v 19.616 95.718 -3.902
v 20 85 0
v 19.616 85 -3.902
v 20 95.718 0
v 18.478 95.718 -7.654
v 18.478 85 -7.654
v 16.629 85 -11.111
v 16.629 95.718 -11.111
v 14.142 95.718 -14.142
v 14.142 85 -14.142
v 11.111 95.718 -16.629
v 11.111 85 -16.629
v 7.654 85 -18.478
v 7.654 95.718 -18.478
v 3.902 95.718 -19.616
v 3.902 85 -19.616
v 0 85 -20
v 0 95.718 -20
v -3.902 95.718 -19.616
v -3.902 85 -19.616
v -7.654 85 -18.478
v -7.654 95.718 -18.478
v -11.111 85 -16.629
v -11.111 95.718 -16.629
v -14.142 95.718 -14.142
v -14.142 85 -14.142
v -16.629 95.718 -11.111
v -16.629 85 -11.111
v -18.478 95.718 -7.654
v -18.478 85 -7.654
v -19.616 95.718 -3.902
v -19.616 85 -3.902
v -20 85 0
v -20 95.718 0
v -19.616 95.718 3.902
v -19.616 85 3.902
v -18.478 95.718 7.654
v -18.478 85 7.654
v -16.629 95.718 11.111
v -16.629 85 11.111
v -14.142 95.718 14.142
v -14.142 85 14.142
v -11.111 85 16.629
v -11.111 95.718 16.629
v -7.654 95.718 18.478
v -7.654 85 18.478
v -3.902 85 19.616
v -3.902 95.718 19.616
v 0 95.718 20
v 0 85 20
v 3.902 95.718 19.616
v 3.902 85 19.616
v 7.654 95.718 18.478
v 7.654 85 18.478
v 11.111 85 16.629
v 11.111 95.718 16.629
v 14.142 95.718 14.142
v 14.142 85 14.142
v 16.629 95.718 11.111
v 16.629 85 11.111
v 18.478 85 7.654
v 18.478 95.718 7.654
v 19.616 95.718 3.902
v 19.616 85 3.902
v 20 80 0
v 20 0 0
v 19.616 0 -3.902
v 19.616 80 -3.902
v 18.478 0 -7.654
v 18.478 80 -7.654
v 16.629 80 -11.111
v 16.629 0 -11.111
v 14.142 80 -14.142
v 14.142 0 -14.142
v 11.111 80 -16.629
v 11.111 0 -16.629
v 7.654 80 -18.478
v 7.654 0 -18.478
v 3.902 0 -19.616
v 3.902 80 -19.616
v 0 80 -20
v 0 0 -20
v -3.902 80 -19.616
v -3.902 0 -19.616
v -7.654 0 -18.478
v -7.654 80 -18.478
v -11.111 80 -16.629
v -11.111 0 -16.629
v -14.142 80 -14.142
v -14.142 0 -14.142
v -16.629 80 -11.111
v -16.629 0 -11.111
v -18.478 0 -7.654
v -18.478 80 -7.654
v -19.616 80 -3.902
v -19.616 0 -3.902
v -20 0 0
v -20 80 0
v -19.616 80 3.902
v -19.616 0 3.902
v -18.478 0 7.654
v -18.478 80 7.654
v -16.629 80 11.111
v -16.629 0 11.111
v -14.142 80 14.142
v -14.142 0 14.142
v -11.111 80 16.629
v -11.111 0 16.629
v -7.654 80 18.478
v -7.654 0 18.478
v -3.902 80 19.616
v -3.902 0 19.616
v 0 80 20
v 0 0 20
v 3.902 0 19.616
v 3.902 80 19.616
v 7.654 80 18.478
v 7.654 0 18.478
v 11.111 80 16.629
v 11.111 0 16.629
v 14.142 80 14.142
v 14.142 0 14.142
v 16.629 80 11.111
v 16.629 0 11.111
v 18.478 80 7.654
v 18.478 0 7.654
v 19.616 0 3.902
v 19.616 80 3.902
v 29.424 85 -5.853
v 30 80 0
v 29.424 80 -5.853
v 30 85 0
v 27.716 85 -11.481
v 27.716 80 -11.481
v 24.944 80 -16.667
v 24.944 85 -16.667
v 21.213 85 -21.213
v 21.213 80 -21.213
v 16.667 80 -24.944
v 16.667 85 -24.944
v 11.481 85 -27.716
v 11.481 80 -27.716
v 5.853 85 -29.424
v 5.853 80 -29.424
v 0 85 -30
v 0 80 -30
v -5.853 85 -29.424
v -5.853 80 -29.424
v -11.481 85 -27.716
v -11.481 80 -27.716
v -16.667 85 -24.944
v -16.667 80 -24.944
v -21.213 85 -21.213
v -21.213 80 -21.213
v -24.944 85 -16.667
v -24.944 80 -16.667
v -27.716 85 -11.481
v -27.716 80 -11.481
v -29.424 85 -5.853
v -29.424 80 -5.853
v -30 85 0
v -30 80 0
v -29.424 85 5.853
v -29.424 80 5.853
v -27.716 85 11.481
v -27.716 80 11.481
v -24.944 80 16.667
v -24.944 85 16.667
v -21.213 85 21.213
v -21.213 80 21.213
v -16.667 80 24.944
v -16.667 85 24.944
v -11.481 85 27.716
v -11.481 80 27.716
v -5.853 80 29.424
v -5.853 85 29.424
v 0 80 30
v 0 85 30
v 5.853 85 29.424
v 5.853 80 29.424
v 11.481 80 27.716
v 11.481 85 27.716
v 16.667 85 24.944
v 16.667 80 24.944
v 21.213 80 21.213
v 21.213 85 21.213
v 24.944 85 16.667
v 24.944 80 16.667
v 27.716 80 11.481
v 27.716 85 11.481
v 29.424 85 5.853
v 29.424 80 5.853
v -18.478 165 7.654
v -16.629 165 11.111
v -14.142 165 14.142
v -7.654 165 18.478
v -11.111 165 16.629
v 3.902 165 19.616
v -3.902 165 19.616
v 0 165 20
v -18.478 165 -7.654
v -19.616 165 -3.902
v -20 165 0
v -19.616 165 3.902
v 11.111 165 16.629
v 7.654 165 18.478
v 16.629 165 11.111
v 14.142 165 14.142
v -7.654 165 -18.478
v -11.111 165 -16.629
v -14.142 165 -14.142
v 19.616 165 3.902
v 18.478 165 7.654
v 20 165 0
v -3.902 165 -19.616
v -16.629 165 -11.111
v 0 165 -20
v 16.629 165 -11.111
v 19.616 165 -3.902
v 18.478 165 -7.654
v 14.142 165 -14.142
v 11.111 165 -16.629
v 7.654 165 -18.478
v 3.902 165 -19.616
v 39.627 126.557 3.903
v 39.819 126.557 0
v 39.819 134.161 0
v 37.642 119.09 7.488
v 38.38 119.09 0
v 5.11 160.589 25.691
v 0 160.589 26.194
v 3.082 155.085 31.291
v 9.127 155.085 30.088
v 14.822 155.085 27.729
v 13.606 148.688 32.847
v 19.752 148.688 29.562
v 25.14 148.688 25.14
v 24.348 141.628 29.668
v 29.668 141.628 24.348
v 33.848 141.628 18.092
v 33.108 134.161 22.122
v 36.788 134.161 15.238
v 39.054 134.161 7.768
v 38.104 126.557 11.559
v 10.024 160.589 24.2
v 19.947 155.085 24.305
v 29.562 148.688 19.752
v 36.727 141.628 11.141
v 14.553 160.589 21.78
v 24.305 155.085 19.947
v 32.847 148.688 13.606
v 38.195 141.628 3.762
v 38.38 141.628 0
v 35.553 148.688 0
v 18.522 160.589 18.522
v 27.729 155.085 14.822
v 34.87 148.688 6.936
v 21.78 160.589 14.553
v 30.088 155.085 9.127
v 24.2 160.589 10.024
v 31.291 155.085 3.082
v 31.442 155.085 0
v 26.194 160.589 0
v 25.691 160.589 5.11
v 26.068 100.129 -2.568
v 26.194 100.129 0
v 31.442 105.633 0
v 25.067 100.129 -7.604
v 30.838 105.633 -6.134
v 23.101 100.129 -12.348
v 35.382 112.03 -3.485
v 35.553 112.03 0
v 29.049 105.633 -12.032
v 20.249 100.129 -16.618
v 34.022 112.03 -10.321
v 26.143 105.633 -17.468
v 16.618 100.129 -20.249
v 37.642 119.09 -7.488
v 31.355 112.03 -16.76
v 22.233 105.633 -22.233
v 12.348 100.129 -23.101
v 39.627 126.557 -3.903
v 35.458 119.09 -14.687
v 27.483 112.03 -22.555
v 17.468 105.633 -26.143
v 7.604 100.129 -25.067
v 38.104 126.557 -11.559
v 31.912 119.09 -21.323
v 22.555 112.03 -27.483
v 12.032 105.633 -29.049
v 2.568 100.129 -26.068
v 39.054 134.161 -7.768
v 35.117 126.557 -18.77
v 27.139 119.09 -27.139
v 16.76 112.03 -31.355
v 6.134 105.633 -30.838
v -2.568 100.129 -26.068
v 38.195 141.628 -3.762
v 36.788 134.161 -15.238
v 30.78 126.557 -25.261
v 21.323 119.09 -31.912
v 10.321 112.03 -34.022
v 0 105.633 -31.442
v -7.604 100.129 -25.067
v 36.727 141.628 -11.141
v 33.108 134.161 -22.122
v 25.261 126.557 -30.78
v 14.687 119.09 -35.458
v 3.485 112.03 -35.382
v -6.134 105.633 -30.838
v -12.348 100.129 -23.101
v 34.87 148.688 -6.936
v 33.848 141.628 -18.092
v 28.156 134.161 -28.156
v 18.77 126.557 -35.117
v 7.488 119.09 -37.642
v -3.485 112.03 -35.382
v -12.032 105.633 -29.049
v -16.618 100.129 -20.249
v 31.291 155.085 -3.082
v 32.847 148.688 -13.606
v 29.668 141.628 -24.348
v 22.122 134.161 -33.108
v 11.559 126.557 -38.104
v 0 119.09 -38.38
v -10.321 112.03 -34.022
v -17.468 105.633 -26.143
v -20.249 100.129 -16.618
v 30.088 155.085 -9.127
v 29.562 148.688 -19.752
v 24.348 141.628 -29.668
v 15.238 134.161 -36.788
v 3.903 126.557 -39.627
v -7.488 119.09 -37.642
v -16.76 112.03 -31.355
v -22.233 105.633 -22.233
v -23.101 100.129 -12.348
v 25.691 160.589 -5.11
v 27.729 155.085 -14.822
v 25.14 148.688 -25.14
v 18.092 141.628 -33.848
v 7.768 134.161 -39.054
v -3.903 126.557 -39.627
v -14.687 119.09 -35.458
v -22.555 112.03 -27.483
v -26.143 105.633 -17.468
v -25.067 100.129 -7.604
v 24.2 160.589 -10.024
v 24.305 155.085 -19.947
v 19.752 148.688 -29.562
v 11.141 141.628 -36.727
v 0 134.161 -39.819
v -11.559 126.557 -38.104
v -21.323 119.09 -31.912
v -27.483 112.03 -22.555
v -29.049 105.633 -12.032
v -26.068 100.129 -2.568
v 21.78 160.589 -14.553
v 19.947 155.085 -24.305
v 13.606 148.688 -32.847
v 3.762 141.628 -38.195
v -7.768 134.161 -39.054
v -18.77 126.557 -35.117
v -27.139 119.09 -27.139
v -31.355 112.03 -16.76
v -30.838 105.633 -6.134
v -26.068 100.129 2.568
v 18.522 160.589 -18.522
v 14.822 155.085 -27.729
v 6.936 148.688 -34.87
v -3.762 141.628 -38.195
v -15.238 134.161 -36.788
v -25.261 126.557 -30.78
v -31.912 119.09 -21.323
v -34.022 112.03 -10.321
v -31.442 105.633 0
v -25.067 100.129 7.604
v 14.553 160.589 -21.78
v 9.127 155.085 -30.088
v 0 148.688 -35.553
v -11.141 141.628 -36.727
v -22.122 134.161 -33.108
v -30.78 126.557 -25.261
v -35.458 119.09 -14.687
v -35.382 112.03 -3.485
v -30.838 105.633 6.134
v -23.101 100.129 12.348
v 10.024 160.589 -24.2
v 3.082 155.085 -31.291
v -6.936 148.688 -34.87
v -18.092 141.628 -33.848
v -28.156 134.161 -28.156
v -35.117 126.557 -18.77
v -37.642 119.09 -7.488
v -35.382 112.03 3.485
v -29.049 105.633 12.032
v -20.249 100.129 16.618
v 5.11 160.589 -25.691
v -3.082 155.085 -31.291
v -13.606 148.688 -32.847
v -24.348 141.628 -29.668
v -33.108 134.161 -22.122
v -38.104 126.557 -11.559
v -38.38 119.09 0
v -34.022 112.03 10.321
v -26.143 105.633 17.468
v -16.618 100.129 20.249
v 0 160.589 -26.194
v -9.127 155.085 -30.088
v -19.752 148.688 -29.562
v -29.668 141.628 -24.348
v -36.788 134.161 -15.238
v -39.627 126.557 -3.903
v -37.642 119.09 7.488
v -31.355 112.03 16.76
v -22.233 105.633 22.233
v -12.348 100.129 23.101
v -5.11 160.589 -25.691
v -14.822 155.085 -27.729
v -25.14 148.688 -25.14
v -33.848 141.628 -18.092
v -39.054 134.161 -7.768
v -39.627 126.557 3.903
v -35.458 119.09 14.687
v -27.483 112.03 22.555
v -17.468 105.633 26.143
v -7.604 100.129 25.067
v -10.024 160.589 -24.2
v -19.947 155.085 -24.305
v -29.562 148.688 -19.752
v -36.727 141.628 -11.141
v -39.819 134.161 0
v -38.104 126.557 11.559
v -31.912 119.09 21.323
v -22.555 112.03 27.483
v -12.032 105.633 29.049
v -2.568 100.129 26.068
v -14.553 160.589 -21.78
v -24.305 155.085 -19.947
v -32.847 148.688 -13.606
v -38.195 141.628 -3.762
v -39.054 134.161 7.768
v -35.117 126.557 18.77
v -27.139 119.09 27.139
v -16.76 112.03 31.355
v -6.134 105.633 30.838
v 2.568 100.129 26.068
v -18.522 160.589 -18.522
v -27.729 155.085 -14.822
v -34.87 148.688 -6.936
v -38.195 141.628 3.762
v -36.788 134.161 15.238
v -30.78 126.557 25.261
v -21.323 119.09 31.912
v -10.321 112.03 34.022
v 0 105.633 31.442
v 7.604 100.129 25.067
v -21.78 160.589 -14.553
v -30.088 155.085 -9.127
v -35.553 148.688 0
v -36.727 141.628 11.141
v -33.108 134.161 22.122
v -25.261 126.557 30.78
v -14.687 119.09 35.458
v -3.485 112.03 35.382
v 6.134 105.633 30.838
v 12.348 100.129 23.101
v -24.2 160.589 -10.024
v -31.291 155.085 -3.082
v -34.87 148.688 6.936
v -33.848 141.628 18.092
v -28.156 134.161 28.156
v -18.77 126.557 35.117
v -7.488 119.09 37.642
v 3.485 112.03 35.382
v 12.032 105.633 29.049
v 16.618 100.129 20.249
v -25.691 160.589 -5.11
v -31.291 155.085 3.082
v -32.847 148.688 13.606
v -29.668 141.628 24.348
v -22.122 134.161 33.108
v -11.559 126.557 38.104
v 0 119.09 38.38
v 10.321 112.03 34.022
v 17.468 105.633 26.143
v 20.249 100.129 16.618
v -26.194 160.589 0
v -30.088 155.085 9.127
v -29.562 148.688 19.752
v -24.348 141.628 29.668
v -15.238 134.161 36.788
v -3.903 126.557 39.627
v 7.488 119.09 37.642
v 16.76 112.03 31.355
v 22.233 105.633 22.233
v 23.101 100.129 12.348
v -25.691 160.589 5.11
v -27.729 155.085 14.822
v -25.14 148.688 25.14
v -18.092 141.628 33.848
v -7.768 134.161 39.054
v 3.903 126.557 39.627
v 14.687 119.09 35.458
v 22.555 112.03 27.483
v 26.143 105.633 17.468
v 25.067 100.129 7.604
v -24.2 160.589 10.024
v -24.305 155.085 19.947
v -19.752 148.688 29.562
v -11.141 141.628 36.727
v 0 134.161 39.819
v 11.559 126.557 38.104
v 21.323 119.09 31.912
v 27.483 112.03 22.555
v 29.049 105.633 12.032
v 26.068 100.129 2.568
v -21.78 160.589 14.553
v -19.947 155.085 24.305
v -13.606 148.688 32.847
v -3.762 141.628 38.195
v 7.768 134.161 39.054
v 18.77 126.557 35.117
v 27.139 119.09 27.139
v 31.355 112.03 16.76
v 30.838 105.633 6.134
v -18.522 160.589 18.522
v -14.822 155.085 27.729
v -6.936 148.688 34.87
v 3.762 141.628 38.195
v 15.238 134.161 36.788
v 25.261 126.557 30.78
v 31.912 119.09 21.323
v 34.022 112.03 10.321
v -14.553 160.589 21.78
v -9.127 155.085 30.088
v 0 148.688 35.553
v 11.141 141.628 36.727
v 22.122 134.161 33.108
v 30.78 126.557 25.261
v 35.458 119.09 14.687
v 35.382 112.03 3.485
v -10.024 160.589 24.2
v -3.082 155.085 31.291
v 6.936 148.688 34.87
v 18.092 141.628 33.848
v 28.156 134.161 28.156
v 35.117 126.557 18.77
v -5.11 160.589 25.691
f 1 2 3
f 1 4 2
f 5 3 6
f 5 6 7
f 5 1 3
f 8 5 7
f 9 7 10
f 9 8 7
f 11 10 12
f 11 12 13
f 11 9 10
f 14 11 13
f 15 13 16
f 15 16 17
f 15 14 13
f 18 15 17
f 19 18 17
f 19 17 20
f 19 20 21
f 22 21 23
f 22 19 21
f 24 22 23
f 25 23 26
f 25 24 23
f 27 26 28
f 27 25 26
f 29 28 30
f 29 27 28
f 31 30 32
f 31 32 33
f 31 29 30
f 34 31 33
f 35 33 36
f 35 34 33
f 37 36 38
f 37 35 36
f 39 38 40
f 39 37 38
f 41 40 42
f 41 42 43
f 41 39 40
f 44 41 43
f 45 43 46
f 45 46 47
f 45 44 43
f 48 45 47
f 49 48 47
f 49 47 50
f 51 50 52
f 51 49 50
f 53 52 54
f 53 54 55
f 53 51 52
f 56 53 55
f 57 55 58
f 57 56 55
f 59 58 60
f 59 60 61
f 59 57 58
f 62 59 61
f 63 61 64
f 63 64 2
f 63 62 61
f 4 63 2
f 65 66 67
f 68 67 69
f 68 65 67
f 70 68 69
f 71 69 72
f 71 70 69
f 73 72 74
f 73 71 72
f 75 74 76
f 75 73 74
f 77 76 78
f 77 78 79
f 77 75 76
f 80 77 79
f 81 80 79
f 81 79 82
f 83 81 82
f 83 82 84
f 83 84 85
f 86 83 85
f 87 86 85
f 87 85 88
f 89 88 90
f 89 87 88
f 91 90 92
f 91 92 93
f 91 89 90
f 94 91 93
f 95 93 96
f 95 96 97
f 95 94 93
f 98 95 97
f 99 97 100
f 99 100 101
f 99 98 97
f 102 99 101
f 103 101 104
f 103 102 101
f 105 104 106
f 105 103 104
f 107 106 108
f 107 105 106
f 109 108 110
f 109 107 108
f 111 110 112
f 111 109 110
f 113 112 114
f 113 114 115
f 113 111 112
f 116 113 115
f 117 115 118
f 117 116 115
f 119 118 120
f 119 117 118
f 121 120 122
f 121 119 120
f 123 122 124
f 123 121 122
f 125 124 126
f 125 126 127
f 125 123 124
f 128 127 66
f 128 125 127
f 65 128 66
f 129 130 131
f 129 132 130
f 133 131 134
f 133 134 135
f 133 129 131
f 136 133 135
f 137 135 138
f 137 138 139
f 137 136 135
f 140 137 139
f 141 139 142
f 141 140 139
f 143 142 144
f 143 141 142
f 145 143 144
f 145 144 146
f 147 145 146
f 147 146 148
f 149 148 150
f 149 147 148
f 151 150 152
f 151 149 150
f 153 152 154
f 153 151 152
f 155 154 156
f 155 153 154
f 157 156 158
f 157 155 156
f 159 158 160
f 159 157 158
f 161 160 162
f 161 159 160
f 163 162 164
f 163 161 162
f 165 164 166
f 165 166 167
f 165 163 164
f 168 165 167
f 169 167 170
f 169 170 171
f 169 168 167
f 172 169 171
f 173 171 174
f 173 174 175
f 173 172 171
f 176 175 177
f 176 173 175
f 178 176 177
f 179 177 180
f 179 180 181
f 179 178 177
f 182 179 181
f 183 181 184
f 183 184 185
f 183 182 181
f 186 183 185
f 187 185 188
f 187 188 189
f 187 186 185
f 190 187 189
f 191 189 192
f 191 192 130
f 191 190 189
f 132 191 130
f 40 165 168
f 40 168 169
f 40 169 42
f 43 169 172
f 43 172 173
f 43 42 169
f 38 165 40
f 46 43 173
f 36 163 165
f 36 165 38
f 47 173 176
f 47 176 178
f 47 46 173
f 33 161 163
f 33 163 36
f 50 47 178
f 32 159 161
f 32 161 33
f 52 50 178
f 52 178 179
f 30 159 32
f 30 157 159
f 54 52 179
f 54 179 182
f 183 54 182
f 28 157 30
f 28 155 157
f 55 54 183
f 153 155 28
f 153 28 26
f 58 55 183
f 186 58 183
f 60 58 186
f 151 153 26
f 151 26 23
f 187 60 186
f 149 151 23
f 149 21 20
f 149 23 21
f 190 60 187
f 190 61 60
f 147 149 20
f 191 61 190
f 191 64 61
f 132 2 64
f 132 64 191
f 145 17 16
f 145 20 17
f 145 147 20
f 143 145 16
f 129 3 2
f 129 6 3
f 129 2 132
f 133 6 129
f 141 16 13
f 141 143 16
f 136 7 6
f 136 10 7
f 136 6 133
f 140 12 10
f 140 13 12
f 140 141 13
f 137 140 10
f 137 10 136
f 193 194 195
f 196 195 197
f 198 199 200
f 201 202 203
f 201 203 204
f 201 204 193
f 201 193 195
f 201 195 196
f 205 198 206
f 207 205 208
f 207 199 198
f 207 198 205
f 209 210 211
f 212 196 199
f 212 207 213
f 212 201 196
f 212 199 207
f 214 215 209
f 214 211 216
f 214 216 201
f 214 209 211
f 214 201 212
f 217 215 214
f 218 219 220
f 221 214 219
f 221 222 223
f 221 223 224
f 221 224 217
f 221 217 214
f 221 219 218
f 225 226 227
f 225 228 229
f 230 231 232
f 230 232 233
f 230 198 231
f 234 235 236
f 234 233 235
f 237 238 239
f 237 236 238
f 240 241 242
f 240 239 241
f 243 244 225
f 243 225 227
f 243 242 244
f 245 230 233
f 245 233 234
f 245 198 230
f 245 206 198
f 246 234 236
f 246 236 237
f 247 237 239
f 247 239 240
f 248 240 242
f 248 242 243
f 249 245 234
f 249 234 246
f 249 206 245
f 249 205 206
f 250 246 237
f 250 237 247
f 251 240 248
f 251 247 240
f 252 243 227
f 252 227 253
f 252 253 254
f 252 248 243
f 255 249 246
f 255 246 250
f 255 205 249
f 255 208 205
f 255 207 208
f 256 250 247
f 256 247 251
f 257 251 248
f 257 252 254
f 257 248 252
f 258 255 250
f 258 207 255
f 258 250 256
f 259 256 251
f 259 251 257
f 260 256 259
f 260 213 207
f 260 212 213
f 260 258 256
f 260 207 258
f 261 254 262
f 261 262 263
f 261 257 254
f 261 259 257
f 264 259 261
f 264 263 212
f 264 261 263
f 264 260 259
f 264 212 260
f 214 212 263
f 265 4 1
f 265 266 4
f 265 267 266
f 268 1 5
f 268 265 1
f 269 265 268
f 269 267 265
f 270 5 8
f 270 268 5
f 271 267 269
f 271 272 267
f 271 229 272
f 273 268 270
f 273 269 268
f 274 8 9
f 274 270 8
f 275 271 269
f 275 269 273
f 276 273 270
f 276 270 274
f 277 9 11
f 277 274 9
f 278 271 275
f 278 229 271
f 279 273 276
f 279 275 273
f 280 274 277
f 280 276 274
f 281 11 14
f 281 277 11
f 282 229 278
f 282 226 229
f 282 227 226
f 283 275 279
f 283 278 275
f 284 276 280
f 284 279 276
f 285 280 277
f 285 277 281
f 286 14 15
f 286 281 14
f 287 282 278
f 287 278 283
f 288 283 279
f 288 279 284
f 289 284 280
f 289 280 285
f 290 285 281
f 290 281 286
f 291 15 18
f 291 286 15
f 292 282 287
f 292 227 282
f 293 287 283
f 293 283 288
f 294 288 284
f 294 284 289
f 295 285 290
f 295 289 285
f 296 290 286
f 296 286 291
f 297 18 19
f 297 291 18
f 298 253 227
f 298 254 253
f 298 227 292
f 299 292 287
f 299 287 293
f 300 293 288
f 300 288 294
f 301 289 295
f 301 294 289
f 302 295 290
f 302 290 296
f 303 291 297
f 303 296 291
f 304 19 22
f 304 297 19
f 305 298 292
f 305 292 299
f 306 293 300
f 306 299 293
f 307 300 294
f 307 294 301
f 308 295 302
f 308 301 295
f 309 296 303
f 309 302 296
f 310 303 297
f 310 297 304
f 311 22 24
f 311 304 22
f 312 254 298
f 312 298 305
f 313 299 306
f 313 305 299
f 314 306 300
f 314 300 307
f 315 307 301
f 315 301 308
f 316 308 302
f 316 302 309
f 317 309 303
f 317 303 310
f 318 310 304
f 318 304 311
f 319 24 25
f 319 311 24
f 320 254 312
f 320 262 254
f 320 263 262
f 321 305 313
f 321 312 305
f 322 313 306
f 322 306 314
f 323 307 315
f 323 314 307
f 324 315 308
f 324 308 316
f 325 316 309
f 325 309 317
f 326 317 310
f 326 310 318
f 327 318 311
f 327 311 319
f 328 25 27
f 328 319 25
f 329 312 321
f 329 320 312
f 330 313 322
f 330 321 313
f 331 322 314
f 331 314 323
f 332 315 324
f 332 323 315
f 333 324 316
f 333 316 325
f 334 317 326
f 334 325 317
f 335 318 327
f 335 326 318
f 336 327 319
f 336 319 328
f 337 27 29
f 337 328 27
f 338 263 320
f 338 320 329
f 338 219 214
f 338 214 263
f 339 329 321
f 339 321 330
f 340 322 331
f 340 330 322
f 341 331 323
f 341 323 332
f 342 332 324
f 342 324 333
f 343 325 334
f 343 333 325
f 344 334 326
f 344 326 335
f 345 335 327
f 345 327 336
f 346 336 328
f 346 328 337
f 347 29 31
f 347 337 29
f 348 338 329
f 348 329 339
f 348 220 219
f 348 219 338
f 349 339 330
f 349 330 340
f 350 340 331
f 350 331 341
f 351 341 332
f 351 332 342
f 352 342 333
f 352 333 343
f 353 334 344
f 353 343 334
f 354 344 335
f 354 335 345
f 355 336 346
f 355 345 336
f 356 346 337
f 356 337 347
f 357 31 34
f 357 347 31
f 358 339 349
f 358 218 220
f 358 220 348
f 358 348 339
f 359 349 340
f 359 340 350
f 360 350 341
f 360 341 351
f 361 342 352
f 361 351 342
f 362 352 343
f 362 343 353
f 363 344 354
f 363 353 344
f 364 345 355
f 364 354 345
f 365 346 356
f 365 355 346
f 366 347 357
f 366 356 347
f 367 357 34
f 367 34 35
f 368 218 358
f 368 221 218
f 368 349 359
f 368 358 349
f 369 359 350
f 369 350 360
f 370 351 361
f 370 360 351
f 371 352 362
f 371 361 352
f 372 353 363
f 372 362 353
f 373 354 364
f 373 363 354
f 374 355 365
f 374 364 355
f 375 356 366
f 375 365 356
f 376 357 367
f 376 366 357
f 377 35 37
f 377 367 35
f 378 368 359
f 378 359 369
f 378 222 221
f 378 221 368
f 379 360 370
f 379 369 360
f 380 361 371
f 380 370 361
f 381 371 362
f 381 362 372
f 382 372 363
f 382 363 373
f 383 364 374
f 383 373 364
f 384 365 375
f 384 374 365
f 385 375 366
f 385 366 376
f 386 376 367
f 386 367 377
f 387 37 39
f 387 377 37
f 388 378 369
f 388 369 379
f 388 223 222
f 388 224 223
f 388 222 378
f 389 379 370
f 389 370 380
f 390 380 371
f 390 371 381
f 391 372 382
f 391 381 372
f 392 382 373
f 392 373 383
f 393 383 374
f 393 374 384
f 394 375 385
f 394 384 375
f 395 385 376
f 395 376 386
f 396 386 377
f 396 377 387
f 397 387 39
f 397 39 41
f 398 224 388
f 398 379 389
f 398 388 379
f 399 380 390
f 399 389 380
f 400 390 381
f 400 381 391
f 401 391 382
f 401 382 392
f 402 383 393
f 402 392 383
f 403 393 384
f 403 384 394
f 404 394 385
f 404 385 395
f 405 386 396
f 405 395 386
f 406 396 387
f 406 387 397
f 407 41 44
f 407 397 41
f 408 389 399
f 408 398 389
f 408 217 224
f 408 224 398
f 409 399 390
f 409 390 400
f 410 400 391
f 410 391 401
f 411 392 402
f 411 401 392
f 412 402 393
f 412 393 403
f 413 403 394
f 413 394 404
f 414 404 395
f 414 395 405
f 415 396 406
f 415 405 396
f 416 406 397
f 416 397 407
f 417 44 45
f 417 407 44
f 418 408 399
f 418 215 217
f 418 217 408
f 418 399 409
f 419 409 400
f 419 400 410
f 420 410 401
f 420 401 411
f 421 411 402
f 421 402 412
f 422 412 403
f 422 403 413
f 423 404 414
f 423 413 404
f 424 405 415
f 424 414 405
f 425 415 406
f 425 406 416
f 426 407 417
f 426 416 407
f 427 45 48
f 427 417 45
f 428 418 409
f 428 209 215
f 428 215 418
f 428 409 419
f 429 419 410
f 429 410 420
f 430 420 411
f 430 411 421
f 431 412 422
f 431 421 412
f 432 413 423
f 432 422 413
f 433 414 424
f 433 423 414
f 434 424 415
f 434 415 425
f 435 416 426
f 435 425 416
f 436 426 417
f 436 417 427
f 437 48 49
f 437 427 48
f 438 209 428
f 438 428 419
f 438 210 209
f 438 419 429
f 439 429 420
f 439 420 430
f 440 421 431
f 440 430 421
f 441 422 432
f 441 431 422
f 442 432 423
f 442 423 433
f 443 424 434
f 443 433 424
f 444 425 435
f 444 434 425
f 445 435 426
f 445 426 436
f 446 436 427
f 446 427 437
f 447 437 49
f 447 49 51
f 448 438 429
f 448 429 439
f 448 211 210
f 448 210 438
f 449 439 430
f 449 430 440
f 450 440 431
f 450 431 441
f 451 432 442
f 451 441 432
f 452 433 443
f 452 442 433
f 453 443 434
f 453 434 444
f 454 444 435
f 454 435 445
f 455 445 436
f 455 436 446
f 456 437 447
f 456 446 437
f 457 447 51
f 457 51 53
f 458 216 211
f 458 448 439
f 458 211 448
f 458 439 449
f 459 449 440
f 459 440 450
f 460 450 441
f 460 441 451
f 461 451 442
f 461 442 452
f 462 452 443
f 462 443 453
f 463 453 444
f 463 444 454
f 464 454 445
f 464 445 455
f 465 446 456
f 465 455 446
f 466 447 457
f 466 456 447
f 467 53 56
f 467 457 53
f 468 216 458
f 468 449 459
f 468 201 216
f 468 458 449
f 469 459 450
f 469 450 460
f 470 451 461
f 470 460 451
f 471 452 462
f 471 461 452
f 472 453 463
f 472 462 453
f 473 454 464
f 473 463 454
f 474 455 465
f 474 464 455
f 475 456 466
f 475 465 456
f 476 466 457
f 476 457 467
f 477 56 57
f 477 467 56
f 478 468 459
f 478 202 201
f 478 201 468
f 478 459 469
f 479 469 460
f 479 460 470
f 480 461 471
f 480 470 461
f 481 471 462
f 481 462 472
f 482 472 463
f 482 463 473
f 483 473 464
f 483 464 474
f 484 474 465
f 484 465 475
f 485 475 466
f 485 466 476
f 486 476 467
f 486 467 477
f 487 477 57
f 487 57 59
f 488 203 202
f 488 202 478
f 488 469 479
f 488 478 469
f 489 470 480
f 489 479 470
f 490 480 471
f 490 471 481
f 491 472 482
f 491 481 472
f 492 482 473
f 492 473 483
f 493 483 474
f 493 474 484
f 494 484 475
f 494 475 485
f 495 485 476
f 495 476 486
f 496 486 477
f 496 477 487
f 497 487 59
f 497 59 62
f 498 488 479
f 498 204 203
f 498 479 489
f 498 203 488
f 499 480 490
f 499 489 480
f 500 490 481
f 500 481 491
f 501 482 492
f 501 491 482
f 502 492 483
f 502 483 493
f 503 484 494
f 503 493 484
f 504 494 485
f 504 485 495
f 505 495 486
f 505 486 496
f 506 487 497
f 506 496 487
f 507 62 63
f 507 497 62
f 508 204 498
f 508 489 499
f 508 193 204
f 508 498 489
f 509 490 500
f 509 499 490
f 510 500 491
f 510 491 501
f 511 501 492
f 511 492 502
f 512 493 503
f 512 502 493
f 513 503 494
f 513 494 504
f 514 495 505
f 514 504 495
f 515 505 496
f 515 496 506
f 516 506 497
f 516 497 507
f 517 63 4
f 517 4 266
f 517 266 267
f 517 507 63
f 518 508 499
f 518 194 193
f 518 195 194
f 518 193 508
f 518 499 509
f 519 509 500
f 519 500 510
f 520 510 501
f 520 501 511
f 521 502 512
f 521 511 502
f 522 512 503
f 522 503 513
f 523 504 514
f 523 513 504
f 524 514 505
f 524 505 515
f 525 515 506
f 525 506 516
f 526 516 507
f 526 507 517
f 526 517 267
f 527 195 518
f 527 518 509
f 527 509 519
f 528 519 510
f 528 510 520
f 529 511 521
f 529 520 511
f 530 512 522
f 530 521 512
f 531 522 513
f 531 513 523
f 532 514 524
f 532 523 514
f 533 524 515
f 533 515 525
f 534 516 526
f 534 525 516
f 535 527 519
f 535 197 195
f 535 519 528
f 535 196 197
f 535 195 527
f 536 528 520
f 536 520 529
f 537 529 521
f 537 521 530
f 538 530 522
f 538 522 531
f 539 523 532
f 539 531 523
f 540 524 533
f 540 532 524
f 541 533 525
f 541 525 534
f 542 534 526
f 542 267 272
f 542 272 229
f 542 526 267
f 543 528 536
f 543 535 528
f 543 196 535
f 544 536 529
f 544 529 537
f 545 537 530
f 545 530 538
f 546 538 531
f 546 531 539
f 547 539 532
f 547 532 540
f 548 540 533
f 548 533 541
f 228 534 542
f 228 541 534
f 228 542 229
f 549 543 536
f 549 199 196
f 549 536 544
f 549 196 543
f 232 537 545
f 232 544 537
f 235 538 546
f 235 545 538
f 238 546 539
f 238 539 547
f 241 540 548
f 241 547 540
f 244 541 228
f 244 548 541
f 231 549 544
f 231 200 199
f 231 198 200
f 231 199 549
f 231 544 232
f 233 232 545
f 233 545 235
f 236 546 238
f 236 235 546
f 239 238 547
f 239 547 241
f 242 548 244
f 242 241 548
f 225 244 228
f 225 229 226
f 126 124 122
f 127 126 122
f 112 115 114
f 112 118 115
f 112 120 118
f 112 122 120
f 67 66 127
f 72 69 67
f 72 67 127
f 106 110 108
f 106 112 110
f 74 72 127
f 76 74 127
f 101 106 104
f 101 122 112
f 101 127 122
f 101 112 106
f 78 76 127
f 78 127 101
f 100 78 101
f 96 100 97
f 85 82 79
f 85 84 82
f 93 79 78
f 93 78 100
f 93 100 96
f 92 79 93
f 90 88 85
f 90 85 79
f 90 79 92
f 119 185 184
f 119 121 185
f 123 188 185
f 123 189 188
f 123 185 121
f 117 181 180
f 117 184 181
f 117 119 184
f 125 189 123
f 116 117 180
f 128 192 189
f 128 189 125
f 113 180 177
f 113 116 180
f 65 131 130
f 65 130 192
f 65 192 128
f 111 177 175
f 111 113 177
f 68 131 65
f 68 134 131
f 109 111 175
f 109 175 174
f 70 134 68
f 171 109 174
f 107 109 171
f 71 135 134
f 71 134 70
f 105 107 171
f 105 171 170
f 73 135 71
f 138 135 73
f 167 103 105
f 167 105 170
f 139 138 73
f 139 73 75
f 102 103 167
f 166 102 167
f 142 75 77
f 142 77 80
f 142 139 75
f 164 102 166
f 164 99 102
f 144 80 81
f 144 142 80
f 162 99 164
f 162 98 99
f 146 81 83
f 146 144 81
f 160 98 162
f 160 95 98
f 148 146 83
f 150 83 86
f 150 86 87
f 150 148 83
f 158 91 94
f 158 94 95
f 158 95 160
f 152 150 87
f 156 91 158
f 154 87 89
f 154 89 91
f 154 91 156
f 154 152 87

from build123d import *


with BuildPart() as part:
    # Sketch1 → Revolve1 (revolve)
    with BuildSketch(Plane.XY):
        with BuildLine():
            Line((0, 0), (20, 0))
            Line((20, 0), (20, 80))
            Line((20, 80), (30, 80))
            Line((30, 80), (30, 85))
            Line((30, 85), (20, 85))
            Line((20, 85), (20, 95.717967697))
            ThreePointArc((20, 95.717967697), (40, 130.358983849), (20, 165))
            Line((20, 165), (0, 165))
            Line((0, 165), (0, 0))
        make_face()
    revolve(axis=Axis((0, 0, 0), (0, 1, 0)))


solid = part.part
